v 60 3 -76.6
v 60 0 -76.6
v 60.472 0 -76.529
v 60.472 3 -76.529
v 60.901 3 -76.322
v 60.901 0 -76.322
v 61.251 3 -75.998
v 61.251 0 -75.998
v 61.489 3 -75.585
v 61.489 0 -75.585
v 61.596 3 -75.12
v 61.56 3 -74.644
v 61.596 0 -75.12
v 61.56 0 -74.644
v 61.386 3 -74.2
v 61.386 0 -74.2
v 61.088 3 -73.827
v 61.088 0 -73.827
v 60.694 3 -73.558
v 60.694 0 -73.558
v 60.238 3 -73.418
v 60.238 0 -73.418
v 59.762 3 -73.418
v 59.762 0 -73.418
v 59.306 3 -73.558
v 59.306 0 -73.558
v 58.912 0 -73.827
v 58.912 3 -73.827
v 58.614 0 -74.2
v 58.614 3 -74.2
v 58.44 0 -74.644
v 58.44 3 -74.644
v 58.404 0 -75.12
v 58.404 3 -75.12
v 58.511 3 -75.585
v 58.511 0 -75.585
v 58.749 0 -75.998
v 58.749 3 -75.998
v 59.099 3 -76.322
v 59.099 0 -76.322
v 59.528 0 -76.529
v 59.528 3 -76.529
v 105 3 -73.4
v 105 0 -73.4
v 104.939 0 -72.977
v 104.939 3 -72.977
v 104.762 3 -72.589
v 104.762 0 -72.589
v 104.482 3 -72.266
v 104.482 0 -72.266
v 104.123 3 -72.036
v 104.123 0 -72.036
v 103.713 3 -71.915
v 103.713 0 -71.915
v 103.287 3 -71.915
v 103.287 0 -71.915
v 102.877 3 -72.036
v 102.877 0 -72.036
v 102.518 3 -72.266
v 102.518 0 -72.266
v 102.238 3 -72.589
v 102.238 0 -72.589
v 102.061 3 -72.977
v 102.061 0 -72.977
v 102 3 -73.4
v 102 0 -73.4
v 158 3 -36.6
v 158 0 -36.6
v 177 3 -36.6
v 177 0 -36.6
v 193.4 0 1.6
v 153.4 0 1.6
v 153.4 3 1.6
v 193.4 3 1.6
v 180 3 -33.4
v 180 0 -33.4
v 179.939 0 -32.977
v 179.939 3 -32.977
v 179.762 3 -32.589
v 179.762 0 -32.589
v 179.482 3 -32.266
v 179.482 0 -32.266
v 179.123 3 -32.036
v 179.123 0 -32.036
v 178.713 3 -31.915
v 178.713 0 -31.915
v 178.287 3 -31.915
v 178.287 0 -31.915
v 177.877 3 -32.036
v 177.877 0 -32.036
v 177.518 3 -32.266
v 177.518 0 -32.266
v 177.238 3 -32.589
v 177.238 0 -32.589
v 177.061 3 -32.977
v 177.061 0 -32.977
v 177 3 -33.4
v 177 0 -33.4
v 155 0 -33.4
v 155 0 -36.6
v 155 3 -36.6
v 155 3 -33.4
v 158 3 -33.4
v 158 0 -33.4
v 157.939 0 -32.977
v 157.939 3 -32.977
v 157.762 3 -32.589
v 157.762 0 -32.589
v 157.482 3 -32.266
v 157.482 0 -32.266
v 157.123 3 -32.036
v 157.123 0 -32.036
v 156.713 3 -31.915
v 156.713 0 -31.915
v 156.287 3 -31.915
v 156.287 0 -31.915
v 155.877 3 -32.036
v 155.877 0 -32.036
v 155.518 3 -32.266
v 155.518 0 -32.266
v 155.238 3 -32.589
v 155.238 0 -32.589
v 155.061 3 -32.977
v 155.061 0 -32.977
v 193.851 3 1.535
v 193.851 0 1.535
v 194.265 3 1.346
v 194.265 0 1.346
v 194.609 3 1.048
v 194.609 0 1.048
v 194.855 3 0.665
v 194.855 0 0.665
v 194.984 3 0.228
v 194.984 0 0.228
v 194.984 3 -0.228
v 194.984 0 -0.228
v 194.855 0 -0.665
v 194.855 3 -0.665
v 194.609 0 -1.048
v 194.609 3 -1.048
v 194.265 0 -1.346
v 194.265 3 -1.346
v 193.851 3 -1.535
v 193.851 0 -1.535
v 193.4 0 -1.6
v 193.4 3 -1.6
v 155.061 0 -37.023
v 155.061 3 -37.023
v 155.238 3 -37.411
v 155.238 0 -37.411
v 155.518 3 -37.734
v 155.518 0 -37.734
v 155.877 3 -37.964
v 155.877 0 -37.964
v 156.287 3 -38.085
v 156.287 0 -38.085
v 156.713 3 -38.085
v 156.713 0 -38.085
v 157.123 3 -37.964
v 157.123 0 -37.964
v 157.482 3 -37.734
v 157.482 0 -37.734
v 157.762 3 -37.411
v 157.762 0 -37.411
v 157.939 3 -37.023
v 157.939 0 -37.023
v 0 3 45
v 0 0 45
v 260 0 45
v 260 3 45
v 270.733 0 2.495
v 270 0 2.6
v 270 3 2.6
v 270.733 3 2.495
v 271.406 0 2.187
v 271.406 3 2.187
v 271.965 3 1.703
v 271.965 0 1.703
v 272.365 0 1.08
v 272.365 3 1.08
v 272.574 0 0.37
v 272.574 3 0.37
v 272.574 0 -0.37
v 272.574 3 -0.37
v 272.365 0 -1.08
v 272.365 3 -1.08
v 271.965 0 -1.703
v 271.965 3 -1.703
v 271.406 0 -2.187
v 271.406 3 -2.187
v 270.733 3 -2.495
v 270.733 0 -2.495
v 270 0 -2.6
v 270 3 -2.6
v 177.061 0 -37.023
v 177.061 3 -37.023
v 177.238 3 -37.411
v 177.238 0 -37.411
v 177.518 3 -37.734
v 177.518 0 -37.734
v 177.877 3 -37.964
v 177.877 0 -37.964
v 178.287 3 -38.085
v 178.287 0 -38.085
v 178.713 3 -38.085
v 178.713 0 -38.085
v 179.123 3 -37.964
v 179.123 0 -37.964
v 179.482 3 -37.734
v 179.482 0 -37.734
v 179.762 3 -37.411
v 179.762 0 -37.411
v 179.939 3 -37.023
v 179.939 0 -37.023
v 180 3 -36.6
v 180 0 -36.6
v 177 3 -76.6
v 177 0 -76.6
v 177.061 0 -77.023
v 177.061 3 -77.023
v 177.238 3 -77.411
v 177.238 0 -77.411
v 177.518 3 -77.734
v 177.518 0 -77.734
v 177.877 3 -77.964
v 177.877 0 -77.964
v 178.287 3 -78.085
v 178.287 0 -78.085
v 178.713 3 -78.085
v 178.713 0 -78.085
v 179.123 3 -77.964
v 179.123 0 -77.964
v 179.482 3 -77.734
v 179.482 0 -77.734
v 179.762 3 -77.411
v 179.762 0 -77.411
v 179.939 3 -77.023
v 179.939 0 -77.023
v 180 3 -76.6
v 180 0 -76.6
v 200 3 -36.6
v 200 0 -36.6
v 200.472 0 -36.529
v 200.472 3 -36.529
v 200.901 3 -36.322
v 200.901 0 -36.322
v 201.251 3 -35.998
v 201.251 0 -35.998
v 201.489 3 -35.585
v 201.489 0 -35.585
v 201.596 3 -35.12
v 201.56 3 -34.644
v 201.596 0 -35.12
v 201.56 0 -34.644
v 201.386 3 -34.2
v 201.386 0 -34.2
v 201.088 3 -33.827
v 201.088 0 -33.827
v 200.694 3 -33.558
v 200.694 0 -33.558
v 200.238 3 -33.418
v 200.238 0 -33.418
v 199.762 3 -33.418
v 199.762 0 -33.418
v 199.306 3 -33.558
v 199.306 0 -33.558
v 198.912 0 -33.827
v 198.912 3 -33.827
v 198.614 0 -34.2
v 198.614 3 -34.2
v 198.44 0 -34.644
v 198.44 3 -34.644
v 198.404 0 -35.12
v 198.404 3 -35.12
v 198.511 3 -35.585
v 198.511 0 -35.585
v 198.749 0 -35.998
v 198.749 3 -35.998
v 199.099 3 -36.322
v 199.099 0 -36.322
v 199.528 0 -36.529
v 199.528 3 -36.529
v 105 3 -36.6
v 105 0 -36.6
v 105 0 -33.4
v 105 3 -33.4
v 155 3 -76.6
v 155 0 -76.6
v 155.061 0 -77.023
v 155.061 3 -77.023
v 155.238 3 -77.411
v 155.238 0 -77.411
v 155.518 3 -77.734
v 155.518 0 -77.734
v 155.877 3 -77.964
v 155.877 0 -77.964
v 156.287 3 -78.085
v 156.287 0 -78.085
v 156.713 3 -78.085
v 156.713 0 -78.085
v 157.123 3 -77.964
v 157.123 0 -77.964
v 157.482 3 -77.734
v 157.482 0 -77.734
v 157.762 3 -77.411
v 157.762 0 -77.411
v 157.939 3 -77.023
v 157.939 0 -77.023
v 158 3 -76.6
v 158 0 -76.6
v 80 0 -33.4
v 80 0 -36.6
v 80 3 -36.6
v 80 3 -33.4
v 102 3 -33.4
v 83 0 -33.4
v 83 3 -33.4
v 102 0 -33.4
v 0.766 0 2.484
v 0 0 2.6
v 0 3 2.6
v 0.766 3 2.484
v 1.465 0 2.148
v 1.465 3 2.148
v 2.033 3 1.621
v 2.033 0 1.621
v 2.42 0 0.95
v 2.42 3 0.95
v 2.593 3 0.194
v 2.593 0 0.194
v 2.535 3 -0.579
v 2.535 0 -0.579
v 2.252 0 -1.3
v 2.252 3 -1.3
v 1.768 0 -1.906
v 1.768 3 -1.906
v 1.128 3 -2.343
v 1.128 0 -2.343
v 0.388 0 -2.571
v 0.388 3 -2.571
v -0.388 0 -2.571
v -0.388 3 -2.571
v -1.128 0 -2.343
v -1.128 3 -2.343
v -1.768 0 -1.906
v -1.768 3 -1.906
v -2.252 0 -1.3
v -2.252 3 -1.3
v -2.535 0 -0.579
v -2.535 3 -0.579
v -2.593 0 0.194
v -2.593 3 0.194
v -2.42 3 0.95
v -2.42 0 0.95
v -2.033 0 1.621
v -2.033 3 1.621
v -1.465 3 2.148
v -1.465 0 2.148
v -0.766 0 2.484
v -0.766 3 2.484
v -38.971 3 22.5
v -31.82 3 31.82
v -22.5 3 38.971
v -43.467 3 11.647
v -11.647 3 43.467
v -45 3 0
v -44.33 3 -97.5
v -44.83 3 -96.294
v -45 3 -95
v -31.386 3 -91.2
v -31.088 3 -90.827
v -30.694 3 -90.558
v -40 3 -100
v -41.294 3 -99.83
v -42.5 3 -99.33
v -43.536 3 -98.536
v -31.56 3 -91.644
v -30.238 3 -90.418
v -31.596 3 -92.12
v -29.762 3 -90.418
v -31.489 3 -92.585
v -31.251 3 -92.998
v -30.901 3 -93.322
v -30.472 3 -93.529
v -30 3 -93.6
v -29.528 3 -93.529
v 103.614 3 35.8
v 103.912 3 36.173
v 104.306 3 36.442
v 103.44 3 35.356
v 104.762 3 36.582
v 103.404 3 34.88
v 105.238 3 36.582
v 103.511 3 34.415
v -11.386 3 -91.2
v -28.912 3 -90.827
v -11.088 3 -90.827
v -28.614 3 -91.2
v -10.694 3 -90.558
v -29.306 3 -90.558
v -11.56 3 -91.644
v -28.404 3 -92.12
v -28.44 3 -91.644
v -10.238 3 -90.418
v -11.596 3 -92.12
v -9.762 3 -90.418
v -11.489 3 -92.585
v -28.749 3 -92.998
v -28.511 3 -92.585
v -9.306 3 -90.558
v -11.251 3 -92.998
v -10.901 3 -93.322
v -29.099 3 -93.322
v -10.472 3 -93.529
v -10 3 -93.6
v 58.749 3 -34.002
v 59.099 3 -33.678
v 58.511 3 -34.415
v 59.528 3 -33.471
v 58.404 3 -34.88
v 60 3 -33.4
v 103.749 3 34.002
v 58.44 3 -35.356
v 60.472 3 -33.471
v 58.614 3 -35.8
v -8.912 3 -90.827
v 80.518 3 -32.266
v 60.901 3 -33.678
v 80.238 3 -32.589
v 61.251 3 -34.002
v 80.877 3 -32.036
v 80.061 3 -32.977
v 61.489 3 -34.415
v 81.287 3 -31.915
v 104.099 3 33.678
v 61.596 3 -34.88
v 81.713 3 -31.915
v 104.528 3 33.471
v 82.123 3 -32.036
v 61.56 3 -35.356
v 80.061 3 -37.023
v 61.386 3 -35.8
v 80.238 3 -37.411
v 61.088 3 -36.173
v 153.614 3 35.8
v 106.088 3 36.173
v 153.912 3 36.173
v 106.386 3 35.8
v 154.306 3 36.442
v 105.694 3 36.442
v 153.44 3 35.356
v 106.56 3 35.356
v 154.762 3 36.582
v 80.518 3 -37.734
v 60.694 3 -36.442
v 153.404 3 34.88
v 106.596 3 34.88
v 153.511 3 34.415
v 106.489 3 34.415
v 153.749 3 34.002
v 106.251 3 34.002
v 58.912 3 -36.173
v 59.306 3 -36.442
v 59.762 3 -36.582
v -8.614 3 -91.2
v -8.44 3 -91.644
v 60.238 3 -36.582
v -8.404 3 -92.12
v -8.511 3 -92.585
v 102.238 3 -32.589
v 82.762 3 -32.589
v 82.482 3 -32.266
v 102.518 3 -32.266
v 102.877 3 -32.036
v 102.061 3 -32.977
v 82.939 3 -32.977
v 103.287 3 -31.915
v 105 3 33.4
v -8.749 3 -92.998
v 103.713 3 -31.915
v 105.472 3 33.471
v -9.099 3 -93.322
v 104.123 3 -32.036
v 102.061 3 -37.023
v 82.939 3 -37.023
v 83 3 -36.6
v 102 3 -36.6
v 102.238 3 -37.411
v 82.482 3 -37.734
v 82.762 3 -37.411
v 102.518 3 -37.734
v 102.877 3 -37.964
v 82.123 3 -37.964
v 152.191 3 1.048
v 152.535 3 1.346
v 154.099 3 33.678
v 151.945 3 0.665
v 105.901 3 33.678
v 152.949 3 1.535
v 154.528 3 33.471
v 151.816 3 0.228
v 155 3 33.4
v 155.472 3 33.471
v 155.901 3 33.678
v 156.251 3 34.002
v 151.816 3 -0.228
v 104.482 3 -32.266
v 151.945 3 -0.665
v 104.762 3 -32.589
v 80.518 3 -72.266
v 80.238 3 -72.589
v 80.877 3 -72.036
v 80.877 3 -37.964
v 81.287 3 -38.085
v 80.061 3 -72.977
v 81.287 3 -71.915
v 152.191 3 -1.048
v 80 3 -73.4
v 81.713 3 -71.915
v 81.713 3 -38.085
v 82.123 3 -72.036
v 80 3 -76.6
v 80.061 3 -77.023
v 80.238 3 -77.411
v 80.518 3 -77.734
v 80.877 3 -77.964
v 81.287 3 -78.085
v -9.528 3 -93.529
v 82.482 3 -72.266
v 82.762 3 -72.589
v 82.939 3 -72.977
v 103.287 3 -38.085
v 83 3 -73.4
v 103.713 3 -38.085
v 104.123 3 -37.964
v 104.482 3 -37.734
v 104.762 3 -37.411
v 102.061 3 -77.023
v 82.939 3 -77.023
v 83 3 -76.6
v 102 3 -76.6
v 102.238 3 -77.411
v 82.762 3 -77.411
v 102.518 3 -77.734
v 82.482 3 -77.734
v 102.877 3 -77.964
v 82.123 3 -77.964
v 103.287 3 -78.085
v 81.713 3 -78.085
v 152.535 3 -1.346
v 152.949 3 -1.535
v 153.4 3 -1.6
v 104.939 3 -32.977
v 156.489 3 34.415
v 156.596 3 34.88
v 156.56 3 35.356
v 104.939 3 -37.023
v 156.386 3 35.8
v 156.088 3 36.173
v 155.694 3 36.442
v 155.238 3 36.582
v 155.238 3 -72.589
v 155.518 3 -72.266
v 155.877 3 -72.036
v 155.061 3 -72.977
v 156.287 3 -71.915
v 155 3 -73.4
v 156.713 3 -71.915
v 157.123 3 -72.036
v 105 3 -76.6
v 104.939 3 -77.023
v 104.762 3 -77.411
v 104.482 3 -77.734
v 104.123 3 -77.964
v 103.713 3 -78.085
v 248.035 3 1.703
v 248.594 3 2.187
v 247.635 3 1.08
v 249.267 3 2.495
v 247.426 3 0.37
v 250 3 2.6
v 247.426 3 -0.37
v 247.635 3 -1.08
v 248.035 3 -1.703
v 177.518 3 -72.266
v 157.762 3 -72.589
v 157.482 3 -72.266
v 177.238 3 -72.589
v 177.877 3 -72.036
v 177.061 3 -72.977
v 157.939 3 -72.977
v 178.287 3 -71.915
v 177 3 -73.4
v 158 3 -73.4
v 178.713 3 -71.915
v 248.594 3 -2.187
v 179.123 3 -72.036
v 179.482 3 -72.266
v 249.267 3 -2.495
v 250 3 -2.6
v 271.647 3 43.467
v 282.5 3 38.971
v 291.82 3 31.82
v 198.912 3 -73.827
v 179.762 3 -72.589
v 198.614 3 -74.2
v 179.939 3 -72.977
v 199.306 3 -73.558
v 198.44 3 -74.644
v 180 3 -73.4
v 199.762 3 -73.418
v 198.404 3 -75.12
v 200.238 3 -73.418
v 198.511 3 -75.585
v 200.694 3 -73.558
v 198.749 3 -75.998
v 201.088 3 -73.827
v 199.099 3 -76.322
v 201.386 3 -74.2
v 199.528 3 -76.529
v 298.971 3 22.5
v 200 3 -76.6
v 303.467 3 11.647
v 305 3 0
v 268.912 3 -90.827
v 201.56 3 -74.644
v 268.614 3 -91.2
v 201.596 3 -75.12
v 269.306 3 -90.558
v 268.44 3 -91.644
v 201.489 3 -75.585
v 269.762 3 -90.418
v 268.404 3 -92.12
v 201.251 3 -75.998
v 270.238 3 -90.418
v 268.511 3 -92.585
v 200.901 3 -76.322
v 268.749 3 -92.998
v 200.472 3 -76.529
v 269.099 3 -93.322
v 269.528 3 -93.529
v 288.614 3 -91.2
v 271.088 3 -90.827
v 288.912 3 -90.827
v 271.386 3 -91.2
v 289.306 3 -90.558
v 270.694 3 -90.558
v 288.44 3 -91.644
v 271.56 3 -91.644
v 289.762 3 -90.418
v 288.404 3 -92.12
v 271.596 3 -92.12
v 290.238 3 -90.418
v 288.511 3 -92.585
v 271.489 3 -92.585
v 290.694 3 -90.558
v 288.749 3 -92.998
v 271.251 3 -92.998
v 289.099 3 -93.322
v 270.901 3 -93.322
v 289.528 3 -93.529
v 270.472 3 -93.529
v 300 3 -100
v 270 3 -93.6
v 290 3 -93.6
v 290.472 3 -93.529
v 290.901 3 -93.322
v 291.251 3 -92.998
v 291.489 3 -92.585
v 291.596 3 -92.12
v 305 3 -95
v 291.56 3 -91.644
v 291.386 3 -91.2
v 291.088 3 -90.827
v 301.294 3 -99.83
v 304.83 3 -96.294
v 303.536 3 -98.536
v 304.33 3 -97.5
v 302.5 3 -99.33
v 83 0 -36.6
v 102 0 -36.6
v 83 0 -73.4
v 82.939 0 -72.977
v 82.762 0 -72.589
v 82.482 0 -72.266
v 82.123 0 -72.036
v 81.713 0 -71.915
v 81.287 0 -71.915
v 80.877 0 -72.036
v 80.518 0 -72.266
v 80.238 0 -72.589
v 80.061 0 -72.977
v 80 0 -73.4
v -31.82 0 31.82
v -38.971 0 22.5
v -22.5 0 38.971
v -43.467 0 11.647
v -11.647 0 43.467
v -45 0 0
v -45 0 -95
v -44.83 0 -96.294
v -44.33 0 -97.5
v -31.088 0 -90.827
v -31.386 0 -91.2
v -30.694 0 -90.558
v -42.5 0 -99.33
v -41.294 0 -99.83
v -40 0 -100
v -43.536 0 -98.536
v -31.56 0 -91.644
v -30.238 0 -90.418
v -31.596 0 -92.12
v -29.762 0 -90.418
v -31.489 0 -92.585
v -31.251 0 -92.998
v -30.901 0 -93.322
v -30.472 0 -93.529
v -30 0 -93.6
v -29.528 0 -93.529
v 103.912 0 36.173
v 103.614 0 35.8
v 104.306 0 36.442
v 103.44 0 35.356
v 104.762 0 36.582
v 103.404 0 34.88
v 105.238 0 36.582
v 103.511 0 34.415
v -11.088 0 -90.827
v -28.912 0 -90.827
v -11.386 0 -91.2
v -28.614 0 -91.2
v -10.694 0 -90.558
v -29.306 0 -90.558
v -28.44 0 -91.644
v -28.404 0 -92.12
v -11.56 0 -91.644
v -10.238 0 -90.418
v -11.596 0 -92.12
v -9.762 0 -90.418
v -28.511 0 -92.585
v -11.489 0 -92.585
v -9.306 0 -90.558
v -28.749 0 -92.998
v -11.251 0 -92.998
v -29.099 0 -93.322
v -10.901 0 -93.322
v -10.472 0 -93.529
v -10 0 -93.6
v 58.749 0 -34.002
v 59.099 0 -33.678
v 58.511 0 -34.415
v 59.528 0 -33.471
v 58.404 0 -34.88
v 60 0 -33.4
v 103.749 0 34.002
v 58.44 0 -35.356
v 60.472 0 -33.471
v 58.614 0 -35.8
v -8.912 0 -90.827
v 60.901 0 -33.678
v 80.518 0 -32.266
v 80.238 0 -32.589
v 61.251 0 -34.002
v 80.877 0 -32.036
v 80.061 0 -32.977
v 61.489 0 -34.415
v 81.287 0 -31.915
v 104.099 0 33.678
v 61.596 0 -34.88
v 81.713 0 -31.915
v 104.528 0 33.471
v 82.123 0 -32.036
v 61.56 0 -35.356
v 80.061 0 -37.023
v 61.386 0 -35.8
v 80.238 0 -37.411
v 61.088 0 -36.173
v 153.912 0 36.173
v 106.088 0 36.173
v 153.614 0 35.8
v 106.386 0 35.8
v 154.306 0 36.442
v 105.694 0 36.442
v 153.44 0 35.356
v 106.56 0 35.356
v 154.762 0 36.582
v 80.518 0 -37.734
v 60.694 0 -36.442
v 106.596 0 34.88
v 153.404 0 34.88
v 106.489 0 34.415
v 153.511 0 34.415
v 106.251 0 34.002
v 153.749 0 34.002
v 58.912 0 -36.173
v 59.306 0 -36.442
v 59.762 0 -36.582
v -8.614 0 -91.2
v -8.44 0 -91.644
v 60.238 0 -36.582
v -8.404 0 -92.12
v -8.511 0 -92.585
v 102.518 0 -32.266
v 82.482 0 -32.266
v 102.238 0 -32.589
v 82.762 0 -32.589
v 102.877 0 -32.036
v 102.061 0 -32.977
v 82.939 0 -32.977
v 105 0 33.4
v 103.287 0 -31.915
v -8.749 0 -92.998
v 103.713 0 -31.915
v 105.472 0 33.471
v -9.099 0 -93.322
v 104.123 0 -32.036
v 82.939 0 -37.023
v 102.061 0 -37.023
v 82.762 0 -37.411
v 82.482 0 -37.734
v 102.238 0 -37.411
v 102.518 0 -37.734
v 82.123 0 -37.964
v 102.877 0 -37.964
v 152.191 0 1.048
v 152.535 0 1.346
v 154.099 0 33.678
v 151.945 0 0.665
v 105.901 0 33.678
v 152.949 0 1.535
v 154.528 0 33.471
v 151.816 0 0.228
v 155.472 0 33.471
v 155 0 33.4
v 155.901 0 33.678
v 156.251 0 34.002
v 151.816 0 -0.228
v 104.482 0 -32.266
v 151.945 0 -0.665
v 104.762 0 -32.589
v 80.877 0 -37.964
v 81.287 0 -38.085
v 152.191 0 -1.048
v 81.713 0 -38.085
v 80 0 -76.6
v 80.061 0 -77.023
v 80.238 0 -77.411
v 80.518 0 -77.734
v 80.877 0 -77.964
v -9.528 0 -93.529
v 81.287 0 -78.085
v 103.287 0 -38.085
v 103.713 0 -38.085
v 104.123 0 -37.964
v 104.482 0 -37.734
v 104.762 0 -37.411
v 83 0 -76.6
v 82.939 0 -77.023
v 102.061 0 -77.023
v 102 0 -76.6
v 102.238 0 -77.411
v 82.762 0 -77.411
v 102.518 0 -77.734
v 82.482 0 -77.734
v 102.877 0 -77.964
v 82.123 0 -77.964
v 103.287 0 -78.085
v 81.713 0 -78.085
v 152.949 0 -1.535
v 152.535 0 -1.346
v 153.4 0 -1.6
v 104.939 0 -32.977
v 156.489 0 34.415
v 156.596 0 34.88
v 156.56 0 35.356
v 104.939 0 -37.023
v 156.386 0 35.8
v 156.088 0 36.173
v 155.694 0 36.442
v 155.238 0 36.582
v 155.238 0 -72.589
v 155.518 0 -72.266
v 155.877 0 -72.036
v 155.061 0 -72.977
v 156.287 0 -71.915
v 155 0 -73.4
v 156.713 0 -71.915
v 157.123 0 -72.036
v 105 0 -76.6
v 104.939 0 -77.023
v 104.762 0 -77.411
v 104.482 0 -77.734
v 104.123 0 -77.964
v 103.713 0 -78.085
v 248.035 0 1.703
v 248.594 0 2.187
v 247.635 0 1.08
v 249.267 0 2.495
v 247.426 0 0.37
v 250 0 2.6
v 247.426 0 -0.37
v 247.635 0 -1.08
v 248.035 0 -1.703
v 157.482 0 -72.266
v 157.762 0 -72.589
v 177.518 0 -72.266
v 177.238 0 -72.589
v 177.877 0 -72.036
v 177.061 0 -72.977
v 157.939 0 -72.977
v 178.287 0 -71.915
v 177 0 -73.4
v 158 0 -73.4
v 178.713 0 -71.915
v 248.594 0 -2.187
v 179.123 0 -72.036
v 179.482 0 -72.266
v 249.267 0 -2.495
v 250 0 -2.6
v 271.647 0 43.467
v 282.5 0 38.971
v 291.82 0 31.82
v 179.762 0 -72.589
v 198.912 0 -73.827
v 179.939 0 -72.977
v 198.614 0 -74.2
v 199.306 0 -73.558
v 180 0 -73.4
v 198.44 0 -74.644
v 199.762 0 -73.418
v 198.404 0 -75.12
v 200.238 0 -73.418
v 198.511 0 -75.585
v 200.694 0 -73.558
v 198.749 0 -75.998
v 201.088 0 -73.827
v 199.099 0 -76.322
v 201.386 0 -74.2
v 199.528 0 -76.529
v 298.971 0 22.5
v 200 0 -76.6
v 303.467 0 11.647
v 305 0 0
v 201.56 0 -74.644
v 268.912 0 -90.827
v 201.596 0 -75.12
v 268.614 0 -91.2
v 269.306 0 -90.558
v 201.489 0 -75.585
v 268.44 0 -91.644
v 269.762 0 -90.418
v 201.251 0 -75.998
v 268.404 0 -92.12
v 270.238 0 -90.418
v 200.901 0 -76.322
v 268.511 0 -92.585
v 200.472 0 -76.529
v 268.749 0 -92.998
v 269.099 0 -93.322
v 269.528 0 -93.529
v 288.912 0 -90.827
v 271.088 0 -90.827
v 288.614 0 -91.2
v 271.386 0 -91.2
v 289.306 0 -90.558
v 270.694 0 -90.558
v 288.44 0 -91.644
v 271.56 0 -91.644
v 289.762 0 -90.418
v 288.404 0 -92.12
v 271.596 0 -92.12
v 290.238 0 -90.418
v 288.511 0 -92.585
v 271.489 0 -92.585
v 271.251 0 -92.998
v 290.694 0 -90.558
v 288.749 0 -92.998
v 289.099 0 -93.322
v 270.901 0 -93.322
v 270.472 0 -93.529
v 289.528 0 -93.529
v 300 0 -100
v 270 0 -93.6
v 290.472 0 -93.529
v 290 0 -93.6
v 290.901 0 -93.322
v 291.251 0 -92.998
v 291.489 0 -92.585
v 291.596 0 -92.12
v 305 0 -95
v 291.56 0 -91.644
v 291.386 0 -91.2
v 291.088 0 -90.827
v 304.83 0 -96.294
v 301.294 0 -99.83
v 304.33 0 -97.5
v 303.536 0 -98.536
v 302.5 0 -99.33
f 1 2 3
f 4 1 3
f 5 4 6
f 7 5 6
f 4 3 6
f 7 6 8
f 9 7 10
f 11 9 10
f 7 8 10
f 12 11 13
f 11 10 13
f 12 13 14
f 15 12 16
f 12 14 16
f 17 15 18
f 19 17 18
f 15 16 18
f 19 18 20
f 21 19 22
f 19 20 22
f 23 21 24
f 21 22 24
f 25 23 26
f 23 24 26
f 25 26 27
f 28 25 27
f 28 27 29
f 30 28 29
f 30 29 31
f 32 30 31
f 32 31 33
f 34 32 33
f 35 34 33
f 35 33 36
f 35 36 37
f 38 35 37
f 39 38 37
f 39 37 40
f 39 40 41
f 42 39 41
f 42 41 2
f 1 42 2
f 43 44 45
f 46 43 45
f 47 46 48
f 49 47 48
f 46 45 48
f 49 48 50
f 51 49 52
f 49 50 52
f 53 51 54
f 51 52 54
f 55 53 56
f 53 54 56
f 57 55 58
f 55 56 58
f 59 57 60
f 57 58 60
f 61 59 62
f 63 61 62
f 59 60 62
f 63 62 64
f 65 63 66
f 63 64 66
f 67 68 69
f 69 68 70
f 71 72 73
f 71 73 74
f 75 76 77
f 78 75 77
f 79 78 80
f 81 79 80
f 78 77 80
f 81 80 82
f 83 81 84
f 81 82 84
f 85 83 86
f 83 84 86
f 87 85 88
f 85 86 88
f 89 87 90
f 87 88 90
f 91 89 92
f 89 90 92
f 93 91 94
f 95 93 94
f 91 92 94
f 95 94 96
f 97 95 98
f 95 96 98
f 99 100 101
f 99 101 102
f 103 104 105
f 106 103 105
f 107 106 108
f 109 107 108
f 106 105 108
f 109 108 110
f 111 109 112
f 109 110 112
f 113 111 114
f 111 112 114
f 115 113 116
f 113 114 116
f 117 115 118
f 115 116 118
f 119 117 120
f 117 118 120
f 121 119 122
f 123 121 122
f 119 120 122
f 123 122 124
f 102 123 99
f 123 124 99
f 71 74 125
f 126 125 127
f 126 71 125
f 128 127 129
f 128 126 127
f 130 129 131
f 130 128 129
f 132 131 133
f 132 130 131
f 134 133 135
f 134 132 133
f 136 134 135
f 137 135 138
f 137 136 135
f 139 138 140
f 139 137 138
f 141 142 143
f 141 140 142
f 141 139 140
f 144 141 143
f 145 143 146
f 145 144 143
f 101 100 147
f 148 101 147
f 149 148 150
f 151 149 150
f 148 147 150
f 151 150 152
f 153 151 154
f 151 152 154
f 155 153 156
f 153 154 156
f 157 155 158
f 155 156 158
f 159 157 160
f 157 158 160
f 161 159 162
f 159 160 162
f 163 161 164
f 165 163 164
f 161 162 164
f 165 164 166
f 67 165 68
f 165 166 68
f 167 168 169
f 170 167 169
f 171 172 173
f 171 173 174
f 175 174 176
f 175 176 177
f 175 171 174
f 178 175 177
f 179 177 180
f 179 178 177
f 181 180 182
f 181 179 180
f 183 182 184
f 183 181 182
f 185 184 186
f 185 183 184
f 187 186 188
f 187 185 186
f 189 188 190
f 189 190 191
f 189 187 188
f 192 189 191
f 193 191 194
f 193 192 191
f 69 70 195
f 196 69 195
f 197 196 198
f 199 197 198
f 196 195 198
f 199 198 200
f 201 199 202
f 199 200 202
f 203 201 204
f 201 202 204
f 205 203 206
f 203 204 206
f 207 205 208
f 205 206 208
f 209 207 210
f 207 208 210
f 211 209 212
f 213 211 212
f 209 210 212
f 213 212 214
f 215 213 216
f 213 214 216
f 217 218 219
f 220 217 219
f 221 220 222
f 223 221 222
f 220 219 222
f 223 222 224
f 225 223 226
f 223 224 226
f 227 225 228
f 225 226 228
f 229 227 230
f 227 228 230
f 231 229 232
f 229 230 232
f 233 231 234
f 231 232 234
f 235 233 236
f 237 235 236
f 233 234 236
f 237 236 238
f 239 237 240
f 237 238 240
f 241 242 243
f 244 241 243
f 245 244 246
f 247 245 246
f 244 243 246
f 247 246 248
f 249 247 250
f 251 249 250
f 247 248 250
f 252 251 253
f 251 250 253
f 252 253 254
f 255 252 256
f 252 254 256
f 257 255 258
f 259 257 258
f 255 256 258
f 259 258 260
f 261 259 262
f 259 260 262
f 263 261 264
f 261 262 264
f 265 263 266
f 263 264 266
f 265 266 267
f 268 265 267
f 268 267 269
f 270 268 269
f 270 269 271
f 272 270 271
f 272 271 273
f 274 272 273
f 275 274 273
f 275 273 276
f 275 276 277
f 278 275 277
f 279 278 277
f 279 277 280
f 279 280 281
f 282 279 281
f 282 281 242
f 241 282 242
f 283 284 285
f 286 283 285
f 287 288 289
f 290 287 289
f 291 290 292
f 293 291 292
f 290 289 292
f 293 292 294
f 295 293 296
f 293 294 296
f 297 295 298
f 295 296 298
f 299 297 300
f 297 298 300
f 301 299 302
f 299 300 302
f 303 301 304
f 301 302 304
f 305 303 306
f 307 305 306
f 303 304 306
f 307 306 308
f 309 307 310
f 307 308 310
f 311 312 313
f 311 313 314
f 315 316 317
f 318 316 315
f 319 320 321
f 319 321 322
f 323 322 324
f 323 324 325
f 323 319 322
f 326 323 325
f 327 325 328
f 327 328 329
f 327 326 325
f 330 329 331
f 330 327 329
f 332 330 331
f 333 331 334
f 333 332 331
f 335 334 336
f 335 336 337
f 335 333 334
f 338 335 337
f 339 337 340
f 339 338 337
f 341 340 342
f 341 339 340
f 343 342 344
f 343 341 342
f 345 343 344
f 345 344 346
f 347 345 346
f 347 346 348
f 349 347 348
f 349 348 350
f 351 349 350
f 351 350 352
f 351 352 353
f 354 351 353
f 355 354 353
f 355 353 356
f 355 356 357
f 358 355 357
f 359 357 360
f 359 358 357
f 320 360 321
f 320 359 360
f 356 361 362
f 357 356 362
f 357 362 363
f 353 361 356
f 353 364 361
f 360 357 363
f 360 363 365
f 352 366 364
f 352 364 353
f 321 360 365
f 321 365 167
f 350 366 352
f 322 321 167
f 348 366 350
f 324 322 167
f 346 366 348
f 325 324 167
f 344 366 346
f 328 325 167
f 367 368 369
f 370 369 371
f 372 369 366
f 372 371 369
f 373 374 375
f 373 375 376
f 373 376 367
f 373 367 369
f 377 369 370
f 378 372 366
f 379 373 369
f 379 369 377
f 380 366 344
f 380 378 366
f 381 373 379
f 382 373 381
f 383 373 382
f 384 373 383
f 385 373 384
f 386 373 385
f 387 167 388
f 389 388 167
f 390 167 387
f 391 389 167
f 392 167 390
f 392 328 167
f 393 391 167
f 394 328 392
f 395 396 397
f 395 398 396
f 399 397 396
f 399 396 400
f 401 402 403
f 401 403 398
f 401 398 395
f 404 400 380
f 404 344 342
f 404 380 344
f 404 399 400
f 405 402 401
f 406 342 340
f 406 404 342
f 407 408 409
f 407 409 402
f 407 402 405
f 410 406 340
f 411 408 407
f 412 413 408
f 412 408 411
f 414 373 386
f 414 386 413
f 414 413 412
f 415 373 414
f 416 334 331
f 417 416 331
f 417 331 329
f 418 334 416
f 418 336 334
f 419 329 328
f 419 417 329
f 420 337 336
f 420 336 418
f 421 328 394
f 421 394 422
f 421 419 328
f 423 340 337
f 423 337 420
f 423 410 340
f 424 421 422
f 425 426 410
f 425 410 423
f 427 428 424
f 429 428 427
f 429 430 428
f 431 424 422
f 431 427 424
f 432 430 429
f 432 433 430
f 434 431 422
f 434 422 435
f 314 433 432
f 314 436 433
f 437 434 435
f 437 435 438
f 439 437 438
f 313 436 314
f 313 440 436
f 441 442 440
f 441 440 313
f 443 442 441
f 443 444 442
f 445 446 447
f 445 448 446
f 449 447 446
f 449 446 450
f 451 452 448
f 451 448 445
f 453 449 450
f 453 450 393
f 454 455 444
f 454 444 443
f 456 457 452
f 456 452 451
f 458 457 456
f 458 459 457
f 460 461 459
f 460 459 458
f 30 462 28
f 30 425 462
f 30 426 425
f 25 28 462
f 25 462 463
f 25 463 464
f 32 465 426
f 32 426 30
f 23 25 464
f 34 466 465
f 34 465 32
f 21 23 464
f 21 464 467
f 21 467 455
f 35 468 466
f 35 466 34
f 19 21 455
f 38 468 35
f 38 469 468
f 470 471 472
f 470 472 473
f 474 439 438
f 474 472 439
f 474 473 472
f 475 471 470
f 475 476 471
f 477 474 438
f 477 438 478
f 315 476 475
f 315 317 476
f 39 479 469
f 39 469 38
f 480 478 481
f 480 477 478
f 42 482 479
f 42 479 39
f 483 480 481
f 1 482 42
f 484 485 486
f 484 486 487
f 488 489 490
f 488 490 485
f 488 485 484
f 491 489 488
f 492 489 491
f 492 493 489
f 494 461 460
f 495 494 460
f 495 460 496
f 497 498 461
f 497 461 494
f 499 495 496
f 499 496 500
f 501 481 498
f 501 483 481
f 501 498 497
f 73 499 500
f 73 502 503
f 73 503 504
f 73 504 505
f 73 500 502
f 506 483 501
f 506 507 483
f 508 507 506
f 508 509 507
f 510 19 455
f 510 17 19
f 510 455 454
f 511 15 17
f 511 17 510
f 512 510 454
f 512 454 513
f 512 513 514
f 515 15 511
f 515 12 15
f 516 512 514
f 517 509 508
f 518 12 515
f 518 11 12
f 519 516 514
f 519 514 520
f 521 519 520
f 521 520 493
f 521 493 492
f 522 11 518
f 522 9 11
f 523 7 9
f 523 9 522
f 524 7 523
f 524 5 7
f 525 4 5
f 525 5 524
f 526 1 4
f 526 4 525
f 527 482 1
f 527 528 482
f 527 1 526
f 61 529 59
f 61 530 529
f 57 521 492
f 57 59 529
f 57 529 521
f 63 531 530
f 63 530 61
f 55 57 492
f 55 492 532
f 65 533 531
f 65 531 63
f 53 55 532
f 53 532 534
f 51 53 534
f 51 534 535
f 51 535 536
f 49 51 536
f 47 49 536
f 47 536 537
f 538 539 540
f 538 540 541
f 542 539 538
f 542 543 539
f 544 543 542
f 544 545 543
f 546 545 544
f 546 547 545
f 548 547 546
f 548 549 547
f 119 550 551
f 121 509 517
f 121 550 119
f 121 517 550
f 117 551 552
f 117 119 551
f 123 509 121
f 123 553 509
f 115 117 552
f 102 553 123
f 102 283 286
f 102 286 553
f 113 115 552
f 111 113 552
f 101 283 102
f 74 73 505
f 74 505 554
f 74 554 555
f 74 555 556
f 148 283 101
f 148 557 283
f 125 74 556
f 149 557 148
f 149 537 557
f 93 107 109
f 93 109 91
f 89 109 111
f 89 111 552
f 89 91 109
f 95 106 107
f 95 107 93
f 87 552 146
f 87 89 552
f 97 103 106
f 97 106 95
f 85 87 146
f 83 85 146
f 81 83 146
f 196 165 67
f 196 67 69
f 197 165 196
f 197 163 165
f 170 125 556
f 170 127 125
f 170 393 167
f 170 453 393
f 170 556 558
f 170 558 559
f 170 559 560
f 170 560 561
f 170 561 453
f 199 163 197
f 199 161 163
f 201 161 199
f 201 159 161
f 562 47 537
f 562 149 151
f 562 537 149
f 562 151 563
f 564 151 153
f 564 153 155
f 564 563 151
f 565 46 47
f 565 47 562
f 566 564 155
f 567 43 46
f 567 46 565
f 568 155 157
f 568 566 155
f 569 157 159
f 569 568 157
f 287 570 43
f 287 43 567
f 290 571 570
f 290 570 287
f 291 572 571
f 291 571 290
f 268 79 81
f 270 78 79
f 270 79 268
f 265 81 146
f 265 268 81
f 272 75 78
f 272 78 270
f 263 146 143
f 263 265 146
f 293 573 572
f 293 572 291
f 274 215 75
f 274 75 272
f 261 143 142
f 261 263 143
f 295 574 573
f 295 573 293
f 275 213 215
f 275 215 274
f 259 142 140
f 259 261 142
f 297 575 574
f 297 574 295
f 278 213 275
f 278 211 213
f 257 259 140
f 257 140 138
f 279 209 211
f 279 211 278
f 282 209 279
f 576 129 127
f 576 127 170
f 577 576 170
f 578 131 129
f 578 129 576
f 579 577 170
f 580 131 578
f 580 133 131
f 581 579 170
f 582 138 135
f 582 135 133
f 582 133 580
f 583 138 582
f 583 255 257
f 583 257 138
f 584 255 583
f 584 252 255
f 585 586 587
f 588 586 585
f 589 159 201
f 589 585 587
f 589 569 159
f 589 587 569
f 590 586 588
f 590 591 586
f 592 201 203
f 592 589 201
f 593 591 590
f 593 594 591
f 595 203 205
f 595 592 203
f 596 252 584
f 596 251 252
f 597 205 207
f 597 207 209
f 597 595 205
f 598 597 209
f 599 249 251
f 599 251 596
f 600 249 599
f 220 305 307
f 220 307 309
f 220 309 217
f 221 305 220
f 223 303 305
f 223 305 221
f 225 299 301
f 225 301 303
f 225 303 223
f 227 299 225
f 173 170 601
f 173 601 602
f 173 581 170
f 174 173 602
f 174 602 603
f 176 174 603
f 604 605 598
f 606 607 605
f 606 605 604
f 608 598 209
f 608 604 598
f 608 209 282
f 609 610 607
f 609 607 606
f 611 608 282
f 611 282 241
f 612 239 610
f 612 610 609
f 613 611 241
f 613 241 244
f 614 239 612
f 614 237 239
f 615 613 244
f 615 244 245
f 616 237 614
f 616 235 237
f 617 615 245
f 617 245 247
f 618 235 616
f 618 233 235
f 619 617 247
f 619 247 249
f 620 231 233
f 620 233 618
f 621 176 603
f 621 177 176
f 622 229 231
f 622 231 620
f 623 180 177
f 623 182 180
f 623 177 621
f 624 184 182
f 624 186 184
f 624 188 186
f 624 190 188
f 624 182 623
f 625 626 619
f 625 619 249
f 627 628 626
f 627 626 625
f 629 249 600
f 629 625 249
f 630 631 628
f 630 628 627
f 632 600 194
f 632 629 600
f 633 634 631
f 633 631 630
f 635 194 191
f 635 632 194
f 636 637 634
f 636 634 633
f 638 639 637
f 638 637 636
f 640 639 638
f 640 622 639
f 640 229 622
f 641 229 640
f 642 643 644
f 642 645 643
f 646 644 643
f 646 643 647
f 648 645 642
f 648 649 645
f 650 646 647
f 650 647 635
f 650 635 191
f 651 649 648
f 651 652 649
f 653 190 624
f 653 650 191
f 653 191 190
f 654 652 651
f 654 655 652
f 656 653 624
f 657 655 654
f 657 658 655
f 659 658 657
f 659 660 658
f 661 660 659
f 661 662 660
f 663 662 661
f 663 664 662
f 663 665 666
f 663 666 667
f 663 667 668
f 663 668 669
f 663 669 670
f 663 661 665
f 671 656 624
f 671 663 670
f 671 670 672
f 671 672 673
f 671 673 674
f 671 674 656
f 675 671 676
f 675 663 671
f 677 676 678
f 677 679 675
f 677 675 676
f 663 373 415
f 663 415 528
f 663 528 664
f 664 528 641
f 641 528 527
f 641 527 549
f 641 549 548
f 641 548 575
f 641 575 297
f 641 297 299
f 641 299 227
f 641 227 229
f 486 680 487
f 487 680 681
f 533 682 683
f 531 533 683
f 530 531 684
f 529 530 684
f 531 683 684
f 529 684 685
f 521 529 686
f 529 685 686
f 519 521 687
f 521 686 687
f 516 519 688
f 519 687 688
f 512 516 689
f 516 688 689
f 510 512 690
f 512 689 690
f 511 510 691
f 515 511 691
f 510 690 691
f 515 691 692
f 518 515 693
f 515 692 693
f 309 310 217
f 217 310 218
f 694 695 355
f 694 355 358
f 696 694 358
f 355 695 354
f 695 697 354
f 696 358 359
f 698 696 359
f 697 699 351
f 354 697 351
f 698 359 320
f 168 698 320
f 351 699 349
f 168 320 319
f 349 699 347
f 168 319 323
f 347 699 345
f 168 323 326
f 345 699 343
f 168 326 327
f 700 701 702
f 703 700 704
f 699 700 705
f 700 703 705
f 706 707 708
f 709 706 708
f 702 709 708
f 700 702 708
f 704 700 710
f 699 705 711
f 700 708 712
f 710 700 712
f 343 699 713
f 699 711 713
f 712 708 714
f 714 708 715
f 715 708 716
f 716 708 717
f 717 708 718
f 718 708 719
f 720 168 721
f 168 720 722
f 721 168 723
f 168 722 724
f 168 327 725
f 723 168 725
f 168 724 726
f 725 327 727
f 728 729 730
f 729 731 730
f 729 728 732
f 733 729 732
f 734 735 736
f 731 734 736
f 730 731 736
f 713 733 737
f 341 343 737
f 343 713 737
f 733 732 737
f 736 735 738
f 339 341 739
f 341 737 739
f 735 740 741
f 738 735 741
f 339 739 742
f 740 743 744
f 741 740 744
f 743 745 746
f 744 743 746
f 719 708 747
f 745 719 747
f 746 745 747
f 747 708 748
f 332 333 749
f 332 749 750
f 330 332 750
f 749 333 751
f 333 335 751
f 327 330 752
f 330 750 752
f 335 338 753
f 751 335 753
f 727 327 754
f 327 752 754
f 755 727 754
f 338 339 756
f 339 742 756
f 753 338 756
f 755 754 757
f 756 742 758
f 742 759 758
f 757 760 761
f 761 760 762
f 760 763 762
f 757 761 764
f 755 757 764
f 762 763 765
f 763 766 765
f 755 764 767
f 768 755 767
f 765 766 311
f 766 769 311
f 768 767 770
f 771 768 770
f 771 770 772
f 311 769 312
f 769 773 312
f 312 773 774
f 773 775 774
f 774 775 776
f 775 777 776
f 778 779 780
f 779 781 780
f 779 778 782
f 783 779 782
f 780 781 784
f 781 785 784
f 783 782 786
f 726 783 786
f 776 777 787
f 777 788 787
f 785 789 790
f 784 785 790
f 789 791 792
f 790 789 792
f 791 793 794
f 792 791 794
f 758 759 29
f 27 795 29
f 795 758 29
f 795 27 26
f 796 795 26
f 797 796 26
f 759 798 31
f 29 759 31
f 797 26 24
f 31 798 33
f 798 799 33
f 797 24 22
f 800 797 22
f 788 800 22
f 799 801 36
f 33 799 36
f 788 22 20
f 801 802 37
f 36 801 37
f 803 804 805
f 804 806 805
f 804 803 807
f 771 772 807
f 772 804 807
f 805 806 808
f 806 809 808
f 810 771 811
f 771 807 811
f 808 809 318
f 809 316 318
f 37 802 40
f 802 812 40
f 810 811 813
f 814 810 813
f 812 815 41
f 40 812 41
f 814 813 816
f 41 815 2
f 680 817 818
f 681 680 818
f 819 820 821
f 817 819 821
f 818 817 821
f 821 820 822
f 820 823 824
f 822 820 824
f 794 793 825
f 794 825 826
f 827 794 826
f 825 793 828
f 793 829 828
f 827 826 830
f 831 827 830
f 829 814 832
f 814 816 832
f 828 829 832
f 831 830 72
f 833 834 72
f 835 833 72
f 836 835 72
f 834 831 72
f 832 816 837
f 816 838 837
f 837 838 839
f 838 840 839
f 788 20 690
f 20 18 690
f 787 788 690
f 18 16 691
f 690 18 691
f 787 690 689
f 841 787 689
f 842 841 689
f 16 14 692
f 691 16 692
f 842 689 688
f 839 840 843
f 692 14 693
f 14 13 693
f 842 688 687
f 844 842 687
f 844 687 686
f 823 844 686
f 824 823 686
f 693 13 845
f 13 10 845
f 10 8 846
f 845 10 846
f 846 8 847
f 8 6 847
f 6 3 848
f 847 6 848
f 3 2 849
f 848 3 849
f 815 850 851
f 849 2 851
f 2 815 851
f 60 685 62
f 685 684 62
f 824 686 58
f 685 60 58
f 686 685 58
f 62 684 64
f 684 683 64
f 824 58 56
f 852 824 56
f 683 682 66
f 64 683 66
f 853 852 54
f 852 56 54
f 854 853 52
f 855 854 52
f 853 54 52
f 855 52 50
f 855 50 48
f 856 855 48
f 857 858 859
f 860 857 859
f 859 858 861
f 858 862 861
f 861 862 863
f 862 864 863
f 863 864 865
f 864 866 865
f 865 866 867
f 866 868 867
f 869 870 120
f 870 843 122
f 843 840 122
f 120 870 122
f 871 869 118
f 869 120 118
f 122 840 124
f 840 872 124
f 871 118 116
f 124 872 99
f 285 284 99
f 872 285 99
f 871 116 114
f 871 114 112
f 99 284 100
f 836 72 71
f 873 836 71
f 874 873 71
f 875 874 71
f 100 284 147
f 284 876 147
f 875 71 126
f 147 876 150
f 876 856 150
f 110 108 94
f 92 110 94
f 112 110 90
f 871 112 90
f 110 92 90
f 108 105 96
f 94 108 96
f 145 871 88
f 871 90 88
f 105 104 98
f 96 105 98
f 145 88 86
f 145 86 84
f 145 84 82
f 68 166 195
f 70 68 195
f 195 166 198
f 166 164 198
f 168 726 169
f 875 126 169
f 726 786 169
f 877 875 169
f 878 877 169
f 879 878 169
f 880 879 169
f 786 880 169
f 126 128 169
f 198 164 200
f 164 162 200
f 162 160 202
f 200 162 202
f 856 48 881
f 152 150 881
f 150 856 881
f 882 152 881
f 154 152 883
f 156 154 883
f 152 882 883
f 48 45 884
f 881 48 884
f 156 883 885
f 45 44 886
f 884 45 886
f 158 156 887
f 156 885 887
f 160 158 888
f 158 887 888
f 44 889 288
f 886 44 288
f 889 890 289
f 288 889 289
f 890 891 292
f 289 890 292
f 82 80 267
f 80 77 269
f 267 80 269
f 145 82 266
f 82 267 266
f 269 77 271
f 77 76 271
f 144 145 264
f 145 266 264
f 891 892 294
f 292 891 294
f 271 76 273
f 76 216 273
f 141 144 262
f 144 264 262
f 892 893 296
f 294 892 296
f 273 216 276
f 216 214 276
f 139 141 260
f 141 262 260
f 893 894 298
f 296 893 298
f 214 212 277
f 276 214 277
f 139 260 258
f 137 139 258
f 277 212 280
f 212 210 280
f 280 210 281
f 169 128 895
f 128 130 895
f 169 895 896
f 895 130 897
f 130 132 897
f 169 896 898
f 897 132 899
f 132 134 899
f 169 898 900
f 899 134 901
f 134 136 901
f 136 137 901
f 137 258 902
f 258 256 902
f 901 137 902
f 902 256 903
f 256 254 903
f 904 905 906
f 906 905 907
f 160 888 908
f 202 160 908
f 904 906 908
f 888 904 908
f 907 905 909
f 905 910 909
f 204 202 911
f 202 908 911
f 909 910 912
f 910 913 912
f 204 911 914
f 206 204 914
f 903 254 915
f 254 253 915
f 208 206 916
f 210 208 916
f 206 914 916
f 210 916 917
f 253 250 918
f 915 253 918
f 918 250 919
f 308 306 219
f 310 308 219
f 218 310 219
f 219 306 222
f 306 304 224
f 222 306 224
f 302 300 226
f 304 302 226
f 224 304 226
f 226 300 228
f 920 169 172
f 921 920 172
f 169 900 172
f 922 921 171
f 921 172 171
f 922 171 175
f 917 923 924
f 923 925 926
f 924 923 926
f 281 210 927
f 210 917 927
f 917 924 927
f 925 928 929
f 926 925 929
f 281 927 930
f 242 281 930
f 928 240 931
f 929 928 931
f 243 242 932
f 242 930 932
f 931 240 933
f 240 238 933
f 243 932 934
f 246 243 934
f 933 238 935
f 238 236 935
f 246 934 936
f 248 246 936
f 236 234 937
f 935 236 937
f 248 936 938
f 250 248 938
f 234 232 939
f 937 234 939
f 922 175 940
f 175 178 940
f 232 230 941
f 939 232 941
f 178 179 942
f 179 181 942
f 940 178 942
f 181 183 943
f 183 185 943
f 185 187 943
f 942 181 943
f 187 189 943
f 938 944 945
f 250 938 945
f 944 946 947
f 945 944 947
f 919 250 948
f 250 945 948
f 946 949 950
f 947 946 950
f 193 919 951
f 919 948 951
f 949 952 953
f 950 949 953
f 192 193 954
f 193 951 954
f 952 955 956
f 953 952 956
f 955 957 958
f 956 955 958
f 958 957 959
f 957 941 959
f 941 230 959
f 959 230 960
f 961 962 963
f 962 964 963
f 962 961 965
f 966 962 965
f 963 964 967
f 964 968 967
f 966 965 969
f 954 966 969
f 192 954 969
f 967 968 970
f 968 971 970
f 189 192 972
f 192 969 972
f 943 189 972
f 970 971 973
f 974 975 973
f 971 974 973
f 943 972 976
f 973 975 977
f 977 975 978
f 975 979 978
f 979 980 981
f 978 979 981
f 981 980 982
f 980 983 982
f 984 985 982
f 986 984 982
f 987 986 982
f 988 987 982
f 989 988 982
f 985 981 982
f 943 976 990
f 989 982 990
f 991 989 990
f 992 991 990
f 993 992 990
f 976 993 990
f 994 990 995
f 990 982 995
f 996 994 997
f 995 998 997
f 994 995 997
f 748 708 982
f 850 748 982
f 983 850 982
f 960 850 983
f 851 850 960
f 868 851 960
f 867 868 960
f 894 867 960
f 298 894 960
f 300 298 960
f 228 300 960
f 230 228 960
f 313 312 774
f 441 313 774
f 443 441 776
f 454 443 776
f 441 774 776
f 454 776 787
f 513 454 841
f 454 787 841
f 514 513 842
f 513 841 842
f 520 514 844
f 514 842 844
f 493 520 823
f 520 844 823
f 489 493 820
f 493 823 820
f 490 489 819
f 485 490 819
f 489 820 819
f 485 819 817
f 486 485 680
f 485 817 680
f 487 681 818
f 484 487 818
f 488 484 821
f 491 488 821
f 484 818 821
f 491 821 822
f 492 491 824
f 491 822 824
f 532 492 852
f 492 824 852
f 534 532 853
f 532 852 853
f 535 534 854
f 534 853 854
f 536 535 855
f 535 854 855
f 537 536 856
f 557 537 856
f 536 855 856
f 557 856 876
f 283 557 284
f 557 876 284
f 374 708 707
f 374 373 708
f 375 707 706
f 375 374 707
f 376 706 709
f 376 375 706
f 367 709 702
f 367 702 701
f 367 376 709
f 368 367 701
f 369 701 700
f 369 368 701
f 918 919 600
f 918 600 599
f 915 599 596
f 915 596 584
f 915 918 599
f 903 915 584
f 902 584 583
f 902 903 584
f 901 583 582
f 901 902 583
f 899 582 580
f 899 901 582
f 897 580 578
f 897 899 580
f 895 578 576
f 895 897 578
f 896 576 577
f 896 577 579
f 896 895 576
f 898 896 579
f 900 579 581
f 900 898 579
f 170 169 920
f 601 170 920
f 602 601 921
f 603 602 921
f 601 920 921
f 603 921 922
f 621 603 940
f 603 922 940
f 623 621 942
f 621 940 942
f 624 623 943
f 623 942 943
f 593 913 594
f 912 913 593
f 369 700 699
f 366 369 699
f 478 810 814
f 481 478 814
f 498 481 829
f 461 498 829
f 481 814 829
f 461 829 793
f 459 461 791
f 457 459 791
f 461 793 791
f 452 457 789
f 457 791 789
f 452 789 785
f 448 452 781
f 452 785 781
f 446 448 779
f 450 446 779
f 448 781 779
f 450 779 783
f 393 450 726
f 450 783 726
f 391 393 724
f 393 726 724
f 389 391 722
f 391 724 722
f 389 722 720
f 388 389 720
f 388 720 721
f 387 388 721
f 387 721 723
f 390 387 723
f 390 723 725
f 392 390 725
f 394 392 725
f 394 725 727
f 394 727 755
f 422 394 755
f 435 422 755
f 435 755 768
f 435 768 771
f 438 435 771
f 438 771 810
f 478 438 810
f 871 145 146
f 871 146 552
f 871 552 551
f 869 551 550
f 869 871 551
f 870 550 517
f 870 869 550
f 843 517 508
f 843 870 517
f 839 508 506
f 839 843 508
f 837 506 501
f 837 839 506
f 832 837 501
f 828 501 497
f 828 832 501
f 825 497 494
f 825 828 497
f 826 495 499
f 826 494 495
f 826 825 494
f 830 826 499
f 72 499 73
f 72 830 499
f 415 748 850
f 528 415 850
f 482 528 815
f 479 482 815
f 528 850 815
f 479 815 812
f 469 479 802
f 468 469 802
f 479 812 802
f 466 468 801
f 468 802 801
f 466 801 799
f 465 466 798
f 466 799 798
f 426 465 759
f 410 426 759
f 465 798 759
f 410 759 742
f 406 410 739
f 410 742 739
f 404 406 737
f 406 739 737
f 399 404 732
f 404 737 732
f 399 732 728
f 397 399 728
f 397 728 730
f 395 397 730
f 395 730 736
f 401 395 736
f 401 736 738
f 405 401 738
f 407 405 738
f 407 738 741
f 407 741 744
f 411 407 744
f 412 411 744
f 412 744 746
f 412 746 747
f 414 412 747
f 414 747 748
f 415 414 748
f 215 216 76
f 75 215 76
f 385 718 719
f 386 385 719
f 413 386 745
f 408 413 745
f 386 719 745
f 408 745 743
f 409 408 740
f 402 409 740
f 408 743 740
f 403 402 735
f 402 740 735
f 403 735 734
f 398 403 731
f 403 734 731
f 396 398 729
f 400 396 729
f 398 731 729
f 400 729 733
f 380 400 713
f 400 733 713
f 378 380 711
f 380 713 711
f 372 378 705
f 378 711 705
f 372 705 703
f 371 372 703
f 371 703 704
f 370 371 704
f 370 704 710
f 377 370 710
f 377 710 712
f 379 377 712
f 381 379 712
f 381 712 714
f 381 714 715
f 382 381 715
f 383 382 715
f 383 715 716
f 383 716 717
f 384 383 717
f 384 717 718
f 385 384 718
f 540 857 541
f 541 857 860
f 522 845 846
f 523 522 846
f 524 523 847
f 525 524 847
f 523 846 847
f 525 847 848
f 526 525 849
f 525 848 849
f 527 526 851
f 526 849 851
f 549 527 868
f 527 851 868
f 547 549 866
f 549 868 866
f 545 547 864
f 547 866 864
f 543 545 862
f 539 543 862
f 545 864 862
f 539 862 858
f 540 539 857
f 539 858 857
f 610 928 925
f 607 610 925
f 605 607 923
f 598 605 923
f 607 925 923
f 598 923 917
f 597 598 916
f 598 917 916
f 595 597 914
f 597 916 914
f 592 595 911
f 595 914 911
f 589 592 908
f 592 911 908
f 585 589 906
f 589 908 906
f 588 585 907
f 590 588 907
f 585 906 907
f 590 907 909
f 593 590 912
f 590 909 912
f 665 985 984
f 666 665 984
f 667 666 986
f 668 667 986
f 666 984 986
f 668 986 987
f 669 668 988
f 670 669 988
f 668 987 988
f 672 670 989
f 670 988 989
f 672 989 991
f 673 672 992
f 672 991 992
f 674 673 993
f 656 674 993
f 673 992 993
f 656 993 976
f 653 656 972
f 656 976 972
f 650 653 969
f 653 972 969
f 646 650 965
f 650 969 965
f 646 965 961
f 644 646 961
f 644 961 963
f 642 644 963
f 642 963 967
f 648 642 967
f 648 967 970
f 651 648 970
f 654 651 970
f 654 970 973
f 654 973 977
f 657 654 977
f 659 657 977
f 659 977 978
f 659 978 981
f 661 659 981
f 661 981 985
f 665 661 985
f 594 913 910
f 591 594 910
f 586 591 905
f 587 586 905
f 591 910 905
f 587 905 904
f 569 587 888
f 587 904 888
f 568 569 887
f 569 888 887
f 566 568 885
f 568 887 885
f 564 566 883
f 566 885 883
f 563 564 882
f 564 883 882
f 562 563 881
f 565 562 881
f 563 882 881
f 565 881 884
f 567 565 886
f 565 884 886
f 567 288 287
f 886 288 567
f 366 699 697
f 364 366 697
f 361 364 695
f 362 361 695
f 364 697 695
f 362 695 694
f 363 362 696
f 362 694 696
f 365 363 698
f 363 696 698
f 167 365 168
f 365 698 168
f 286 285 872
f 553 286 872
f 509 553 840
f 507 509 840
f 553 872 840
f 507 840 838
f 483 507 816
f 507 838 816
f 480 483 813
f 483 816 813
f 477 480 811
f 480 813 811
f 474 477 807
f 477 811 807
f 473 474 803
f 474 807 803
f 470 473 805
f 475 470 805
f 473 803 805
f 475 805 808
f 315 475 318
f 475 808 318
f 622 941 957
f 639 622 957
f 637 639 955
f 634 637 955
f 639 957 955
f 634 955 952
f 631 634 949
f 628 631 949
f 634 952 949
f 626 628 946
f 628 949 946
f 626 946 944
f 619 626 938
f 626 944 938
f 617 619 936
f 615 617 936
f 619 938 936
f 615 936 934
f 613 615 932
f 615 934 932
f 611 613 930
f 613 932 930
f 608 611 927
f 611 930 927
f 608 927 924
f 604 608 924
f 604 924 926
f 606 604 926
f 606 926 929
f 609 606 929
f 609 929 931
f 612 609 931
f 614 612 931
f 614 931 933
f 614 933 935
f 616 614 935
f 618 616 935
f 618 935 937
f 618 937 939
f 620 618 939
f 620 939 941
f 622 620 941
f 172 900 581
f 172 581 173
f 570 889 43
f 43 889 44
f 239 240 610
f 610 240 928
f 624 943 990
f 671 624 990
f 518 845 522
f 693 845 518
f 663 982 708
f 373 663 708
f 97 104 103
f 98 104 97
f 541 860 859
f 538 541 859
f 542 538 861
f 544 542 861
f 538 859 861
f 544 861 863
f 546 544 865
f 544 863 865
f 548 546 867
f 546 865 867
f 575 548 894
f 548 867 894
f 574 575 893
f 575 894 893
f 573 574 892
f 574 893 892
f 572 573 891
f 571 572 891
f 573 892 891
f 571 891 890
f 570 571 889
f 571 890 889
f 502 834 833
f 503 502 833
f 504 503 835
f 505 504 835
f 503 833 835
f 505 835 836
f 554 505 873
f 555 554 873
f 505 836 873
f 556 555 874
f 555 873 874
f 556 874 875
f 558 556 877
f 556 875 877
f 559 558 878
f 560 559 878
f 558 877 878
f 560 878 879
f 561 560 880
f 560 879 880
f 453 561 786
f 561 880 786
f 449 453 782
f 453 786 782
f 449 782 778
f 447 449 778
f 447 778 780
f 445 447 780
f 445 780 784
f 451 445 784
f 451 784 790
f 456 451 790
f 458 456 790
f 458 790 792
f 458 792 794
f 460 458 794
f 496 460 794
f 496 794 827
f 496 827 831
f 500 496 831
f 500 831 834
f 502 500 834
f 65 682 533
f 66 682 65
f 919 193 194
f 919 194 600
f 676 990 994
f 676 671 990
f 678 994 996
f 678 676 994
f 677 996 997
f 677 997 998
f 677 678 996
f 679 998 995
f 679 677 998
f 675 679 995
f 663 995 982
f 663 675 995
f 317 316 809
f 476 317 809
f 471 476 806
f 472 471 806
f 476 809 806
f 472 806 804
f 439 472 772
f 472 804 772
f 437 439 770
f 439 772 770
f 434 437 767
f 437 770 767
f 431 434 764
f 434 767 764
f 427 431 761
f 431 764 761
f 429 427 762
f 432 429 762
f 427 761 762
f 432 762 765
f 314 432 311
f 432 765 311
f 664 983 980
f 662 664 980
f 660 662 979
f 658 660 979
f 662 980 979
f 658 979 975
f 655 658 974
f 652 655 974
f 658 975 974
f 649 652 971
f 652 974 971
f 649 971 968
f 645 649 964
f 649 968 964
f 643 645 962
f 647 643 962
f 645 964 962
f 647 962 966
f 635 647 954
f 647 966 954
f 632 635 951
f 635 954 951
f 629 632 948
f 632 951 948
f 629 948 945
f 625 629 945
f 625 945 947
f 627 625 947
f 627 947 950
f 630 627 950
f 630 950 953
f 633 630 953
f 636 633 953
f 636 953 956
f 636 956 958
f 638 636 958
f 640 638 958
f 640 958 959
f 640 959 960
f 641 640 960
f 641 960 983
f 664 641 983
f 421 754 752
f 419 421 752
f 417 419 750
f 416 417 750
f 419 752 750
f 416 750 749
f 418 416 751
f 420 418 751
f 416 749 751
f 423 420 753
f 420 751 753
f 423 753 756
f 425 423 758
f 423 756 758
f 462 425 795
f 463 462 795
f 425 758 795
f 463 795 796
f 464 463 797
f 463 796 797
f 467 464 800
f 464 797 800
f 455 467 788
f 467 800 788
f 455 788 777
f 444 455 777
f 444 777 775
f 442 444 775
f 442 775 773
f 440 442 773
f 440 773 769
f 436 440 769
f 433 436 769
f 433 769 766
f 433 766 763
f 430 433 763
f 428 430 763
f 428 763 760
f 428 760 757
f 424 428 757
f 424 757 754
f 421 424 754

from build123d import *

# Parameters (mm, degrees)
SKETCH1_R           = 2.6
BOSS_EXTRUDE1_DEPTH = 3
SKETCH2_W           = 3
SKETCH2_H           = 3.2
SKETCH2_W_2         = 19
SKETCH2_R           = 1.6
CUT_EXTRUDE1_DEPTH  = 10
FILLET1_R           = 5
SKETCH3_R           = 1.6
CUT_EXTRUDE2_DEPTH  = 321.989096388


with BuildPart() as part:
    # Sketch1 → Boss-Extrude1 (new body)
    # profile 1 of 2: a face of its own
    with BuildSketch(Plane(origin=(0, 0, 0), x_dir=(1, 0, 0), z_dir=(0, 1, 0))):
        with BuildLine():
            Line((0, -45), (260, -45))
            ThreePointArc((260, -45), (305, 0), (260, 45))
            Line((260, 45), (0, 45))
            ThreePointArc((0, 45), (-45, 0), (0, -45))
        make_face()
        with Locations(Location((0, 0, 0), (0, 0, 270))):
            Circle(SKETCH1_R, mode=Mode.SUBTRACT)
        with BuildLine():
            ThreePointArc((250, 2.6), (247.4, 0), (250, -2.6))
            Line((250, -2.6), (270, -2.6))
            ThreePointArc((270, -2.6), (272.6, 0), (270, 2.6))
            Line((270, 2.6), (250, 2.6))
        make_face(mode=Mode.SUBTRACT)
    # profile 2 of 2: a face of its own
    with BuildSketch(Plane(origin=(0, 0, 0), x_dir=(1, 0, 0), z_dir=(0, 1, 0))):
        with BuildLine():
            ThreePointArc((-45, 0), (-31.819805153, 31.819805153), (0, 45))
            Line((0, 45), (260, 45))
            ThreePointArc((260, 45), (291.819805153, 31.819805153), (305, 0))
            Line((305, 0), (305, 100))
            Line((305, 100), (-45, 100))
            Line((-45, 100), (-45, 0))
        make_face()
    extrude(amount=BOSS_EXTRUDE1_DEPTH)

    # Sketch2 → Cut-Extrude1 (cut)
    with BuildSketch(Plane.XZ):
        with Locations((81.5, -35)):
            Rectangle(SKETCH2_W, SKETCH2_H)
        with BuildLine():
            Line((80, -33.4), (83, -33.4))
            ThreePointArc((83, -33.4), (81.5, -31.9), (80, -33.4))
        make_face()
        with BuildLine():
            ThreePointArc((80, -36.6), (81.5, -38.1), (83, -36.6))
            Line((83, -36.6), (80, -36.6))
        make_face()
        with Locations((92.5, -35)):
            Rectangle(SKETCH2_W_2, SKETCH2_H)
        with BuildLine():
            ThreePointArc((105, -33.4), (103.5, -31.9), (102, -33.4))
            Line((102, -33.4), (105, -33.4))
        make_face()
        with Locations((103.5, -35)):
            Rectangle(SKETCH2_W, SKETCH2_H)
        with BuildLine():
            Line((105, -36.6), (102, -36.6))
            ThreePointArc((102, -36.6), (103.5, -38.1), (105, -36.6))
        make_face()
        with BuildLine():
            ThreePointArc((83, -73.4), (81.5, -71.9), (80, -73.4))
            Line((80, -73.4), (83, -73.4))
        make_face()
        with Locations((81.5, -75)):
            Rectangle(SKETCH2_W, SKETCH2_H)
        with Locations((92.5, -75)):
            Rectangle(SKETCH2_W_2, SKETCH2_H)
        with BuildLine():
            Line((83, -76.6), (80, -76.6))
            ThreePointArc((80, -76.6), (81.5, -78.1), (83, -76.6))
        make_face()
        with BuildLine():
            ThreePointArc((105, -73.4), (103.5, -71.9), (102, -73.4))
            Line((102, -73.4), (105, -73.4))
        make_face()
        with Locations((103.5, -75)):
            Rectangle(SKETCH2_W, SKETCH2_H)
        with BuildLine():
            Line((105, -76.6), (102, -76.6))
            ThreePointArc((102, -76.6), (103.5, -78.1), (105, -76.6))
        make_face()
        with BuildLine():
            Line((155, -33.4), (158, -33.4))
            ThreePointArc((158, -33.4), (156.5, -31.9), (155, -33.4))
        make_face()
        with Locations((156.5, -35)):
            Rectangle(SKETCH2_W, SKETCH2_H)
        with BuildLine():
            ThreePointArc((155, -36.6), (156.5, -38.1), (158, -36.6))
            Line((158, -36.6), (155, -36.6))
        make_face()
        with Locations((167.5, -35)):
            Rectangle(SKETCH2_W_2, SKETCH2_H)
        with BuildLine():
            Line((177, -33.4), (180, -33.4))
            ThreePointArc((180, -33.4), (178.5, -31.9), (177, -33.4))
        make_face()
        with Locations((178.5, -35)):
            Rectangle(SKETCH2_W, SKETCH2_H)
        with BuildLine():
            ThreePointArc((177, -36.6), (178.5, -38.1), (180, -36.6))
            Line((180, -36.6), (177, -36.6))
        make_face()
        with BuildLine():
            ThreePointArc((158, -73.4), (156.5, -71.9), (155, -73.4))
            Line((155, -73.4), (158, -73.4))
        make_face()
        with Locations((156.5, -75)):
            Rectangle(SKETCH2_W, SKETCH2_H)
        with BuildLine():
            Line((158, -76.6), (155, -76.6))
            ThreePointArc((155, -76.6), (156.5, -78.1), (158, -76.6))
        make_face()
        with Locations((167.5, -75)):
            Rectangle(SKETCH2_W_2, SKETCH2_H)
        with BuildLine():
            ThreePointArc((180, -73.4), (178.5, -71.9), (177, -73.4))
            Line((177, -73.4), (180, -73.4))
        make_face()
        with Locations((178.5, -75)):
            Rectangle(SKETCH2_W, SKETCH2_H)
        with BuildLine():
            Line((180, -76.6), (177, -76.6))
            ThreePointArc((177, -76.6), (178.5, -78.1), (180, -76.6))
        make_face()
        with Locations(Location((200, -75, 0), (0, 0, 270))):
            Circle(SKETCH2_R)
        with Locations(Location((290, -92, 0), (0, 0, 270))):
            Circle(SKETCH2_R)
        with Locations(Location((270, -92, 0), (0, 0, 270))):
            Circle(SKETCH2_R)
        with Locations(Location((60, -35, 0), (0, 0, 90))):
            Circle(SKETCH2_R)
        with Locations(Location((60, -75, 0), (0, 0, 270))):
            Circle(SKETCH2_R)
        with Locations(Location((-10, -92, 0), (0, 0, 270))):
            Circle(SKETCH2_R)
        with Locations(Location((-30, -92, 0), (0, 0, 270))):
            Circle(SKETCH2_R)
        with Locations(Location((200, -35, 0), (0, 0, 270))):
            Circle(SKETCH2_R)
    extrude(amount=-CUT_EXTRUDE1_DEPTH, mode=Mode.SUBTRACT)

    # Fillet1
    fillet1_edges = [part.edges().sort_by_distance(p)[0] for p in [
        (-45, 1.5, -100),
        (305, 1.5, -100),
    ]]
    fillet(fillet1_edges, radius=FILLET1_R)

    # Sketch3 → Cut-Extrude2 (cut, through all)
    with BuildSketch(Plane.XZ):
        with Locations(Location((105, 35, 0), (0, 0, 270))):
            Circle(SKETCH3_R)
        with Locations(Location((155, 35, 0), (0, 0, 270))):
            Circle(SKETCH3_R)
        with BuildLine():
            Line((193.4, -1.6), (153.4, -1.6))
            ThreePointArc((153.4, -1.6), (151.8, 0), (153.4, 1.6))
            Line((153.4, 1.6), (193.4, 1.6))
            ThreePointArc((193.4, 1.6), (195, 0), (193.4, -1.6))
        make_face()
    extrude(amount=-CUT_EXTRUDE2_DEPTH, mode=Mode.SUBTRACT)


solid = part.part
